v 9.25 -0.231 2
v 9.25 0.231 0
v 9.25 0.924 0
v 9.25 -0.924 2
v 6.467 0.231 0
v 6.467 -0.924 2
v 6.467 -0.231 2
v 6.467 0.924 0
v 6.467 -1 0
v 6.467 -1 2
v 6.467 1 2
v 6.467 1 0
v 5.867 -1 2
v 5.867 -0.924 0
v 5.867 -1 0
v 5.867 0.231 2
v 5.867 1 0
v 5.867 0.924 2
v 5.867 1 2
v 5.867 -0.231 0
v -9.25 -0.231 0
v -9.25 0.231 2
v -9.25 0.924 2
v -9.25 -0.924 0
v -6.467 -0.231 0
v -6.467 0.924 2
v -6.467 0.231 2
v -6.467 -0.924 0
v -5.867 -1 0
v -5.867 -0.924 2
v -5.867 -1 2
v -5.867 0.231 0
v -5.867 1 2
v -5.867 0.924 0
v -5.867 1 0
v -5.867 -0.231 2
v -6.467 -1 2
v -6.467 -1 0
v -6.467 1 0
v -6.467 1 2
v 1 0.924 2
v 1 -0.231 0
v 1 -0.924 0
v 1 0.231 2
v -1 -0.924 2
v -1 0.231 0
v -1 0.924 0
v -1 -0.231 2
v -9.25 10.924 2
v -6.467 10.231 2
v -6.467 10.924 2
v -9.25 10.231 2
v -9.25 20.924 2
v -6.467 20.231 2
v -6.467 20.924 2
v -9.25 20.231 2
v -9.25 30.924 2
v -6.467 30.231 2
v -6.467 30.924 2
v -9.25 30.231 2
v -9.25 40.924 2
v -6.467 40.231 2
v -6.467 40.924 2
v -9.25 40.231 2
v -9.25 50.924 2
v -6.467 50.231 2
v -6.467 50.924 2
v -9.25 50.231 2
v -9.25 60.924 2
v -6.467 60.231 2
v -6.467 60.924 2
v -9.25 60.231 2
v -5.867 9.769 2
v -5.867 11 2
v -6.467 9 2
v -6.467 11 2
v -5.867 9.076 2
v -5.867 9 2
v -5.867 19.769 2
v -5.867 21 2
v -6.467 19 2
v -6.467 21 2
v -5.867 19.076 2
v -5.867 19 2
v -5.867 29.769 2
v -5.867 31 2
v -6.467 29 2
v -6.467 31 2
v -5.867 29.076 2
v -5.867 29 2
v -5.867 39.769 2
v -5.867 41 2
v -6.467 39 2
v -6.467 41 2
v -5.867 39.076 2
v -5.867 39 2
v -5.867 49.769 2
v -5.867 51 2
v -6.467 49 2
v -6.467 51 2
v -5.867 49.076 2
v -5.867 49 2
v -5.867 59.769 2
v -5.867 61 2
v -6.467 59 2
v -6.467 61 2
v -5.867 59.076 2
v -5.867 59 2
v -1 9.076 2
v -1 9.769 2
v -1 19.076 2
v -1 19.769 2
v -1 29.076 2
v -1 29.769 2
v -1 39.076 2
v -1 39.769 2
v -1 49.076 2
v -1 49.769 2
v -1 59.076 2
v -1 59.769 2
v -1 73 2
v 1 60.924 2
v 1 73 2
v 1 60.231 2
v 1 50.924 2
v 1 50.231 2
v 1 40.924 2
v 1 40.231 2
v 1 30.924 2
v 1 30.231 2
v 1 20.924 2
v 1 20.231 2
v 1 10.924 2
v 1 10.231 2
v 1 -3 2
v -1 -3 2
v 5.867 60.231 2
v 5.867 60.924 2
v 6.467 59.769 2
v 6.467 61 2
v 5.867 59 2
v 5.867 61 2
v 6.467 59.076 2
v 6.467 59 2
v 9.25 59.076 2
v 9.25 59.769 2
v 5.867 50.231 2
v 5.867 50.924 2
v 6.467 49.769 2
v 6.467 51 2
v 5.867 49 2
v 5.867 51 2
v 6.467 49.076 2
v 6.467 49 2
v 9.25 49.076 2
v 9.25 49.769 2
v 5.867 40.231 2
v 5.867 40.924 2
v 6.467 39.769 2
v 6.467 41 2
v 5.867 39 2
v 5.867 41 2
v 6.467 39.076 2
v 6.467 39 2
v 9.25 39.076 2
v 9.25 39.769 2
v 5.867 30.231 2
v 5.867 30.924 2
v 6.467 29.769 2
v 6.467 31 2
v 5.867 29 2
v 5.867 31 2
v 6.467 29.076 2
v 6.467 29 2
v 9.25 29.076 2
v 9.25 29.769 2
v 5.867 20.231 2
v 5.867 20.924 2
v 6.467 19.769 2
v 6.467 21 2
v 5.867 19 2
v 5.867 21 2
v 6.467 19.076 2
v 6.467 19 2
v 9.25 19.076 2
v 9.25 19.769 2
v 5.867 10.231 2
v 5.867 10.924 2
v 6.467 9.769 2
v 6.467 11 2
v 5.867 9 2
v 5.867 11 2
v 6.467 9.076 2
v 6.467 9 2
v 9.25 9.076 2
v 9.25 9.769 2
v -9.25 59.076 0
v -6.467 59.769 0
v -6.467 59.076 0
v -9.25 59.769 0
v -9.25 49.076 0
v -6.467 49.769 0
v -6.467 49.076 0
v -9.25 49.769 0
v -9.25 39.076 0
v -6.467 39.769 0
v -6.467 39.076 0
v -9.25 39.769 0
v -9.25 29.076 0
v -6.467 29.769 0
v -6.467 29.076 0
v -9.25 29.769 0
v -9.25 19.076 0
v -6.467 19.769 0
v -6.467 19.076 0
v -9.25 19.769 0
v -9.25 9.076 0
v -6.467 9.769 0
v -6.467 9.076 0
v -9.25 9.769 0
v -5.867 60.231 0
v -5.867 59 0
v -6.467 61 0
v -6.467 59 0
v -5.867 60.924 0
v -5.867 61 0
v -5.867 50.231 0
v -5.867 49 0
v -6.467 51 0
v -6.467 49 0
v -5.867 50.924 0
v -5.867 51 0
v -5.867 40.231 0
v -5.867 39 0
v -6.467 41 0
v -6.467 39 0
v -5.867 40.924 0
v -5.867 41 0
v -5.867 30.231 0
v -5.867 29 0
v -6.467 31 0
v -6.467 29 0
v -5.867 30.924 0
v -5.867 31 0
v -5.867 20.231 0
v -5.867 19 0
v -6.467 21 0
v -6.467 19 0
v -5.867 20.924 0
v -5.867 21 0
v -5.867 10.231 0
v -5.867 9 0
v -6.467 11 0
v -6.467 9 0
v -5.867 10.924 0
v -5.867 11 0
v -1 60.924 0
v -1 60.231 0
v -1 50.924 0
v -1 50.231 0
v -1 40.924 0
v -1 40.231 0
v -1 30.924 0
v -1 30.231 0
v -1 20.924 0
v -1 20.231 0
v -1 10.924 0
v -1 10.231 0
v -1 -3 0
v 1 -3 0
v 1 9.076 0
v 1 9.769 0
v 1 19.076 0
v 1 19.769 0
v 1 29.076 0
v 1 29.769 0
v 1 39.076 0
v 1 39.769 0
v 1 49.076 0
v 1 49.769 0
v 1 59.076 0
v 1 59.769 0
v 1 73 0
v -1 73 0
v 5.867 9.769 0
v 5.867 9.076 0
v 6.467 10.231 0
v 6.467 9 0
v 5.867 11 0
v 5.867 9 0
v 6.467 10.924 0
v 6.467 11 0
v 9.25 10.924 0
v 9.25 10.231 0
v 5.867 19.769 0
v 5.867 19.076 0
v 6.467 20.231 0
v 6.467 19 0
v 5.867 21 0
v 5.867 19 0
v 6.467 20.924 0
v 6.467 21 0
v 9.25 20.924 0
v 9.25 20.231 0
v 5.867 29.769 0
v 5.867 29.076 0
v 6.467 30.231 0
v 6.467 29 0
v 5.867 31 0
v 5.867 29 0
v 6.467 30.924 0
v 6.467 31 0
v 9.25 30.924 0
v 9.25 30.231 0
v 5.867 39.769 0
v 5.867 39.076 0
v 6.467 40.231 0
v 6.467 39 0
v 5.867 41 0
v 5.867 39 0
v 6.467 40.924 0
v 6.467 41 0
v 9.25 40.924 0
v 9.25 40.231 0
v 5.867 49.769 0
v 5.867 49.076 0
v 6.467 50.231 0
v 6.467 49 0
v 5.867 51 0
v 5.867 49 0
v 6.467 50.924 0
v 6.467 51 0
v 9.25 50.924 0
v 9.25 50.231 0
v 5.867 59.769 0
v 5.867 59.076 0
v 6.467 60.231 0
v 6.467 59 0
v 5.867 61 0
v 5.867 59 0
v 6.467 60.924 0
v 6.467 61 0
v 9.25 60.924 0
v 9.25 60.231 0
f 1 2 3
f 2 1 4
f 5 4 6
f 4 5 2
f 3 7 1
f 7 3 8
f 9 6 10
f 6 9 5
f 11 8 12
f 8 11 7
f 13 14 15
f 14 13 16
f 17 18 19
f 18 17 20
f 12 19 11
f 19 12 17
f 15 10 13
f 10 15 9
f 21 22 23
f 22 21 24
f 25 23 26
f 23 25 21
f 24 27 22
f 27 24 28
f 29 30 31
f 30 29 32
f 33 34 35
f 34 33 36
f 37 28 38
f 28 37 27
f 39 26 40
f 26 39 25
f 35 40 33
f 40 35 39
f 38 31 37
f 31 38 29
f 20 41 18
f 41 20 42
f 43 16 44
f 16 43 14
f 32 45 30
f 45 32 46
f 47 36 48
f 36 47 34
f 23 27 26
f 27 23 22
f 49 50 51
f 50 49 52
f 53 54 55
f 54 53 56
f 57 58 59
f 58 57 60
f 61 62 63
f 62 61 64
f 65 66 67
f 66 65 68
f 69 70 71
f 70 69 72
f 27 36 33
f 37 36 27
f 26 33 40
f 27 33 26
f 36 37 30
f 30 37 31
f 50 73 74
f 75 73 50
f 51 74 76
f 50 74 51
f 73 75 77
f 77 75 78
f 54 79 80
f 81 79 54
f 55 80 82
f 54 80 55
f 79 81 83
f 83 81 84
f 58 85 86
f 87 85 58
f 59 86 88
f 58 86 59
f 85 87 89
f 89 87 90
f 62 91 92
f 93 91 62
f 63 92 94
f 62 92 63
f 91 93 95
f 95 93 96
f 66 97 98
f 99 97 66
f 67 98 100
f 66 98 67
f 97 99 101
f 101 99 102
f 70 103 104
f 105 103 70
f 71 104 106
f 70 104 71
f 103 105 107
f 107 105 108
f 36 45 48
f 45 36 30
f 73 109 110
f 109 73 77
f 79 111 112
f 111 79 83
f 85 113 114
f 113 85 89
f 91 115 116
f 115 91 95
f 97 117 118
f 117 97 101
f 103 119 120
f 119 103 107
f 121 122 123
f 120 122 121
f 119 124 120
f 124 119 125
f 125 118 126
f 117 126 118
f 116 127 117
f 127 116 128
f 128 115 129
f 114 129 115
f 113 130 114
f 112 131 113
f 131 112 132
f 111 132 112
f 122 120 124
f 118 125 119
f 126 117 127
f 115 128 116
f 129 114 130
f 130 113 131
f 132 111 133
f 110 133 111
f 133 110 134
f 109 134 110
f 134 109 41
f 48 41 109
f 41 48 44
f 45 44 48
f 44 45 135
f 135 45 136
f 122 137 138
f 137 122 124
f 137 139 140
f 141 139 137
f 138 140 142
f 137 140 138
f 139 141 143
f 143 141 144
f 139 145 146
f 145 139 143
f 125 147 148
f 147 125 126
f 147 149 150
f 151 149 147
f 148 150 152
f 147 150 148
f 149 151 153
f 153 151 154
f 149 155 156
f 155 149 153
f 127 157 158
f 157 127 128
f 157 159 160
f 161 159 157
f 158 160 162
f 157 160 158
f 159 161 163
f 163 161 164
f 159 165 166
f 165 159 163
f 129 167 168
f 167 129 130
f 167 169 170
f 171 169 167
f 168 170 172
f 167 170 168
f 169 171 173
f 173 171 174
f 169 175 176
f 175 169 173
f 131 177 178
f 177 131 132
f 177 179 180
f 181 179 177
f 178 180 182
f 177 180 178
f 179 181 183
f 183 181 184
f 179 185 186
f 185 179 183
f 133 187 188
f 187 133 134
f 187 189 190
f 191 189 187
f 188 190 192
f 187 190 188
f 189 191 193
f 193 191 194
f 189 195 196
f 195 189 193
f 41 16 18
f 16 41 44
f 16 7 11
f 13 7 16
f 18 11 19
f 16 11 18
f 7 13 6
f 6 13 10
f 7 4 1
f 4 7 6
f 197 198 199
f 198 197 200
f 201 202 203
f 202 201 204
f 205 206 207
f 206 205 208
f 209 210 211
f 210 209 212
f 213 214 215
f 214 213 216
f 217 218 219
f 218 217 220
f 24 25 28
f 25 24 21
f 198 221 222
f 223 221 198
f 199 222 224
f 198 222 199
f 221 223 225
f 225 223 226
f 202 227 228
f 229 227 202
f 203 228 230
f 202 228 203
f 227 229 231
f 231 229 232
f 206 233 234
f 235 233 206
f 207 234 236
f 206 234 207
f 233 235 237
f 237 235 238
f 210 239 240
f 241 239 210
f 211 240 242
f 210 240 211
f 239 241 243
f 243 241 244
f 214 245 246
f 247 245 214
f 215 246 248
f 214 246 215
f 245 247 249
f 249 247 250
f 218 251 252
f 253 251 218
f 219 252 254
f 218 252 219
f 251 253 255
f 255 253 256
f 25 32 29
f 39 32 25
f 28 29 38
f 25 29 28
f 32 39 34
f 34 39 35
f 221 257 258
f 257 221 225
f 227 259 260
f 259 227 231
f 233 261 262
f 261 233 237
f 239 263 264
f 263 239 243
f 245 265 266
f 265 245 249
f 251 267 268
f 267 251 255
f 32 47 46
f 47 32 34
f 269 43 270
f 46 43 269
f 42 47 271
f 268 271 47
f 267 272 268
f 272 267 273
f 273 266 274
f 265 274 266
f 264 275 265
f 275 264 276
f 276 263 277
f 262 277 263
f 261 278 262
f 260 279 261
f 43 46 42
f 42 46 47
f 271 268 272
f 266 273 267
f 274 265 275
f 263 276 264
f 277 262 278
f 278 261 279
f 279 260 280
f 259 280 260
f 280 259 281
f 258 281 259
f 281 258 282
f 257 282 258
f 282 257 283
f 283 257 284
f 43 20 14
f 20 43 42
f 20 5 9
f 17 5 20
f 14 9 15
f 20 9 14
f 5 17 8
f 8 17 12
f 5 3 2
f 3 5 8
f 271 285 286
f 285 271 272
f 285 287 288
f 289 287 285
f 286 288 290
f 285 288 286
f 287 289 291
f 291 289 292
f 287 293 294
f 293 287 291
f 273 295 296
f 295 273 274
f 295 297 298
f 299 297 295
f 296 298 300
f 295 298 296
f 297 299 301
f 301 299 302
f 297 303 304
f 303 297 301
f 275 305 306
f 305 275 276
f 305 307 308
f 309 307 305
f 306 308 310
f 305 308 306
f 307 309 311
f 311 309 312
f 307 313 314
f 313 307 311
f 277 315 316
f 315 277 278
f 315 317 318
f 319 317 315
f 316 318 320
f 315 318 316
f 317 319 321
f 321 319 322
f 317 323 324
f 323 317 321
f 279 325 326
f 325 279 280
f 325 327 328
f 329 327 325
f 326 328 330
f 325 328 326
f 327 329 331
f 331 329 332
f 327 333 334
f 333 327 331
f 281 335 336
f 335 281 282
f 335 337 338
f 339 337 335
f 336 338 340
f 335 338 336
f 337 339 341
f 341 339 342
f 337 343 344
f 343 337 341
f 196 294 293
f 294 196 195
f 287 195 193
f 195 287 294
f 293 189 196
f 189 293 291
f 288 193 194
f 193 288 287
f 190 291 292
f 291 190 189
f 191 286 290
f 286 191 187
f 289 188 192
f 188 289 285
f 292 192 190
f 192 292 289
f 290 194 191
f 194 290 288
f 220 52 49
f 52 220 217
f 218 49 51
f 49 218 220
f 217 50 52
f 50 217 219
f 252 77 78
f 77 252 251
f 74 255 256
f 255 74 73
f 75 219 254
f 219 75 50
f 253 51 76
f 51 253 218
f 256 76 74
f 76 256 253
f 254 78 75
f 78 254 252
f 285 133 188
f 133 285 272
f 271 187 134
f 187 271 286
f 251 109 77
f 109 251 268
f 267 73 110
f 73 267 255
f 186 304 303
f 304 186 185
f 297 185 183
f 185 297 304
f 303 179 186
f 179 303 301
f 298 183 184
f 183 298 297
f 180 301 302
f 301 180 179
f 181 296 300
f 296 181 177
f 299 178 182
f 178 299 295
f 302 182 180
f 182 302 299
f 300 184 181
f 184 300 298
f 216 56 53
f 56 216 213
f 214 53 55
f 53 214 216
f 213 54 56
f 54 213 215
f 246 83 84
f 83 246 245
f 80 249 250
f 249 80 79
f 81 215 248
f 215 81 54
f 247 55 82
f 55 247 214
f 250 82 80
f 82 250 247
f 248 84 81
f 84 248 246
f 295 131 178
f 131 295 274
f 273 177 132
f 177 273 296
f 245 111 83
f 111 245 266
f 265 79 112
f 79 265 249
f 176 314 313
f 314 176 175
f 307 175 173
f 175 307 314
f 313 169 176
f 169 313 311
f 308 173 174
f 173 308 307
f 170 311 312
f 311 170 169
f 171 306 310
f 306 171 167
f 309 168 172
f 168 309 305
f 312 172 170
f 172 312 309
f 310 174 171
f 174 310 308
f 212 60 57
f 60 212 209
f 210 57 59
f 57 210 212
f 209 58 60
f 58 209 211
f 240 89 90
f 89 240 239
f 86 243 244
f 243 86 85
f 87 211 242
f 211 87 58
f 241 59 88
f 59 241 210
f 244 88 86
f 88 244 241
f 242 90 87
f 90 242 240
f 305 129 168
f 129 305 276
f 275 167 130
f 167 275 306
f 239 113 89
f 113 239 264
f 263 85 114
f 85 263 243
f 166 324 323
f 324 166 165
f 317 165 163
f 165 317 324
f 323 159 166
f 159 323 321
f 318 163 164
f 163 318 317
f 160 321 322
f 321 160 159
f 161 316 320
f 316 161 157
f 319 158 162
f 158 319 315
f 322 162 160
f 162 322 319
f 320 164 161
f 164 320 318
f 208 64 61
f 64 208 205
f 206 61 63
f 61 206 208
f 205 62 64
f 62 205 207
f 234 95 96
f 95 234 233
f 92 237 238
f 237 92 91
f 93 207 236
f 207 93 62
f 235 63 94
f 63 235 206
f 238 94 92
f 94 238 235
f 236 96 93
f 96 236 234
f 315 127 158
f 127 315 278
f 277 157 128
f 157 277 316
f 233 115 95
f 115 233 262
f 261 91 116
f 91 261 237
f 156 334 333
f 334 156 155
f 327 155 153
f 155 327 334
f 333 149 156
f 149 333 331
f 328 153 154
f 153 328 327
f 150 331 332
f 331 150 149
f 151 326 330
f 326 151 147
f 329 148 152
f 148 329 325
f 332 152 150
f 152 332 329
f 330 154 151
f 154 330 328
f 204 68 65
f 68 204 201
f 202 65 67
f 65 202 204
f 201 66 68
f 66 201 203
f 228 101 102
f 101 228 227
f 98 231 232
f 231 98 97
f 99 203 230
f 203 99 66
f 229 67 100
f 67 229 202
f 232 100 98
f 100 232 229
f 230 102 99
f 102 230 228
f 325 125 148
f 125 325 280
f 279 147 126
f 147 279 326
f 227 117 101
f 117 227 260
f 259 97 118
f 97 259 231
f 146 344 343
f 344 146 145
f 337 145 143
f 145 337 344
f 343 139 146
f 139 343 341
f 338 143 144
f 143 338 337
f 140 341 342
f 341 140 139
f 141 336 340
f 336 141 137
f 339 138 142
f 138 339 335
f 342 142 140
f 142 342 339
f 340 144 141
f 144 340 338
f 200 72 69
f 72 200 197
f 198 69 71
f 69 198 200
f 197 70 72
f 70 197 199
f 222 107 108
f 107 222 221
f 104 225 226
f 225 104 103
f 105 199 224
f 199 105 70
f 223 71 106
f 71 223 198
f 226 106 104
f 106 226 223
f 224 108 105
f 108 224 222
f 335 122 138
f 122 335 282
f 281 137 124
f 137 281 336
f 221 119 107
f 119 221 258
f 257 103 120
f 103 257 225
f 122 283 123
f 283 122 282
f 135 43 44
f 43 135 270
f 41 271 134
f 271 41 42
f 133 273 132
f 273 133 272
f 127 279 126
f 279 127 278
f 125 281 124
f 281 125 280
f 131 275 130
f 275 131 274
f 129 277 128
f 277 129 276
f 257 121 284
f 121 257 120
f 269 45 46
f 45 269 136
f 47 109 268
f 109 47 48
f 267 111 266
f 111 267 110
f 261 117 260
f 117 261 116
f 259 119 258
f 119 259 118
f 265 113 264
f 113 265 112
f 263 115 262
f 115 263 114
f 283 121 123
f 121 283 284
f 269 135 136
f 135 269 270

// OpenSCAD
$fn=50;
ts=2;
tl=0.6;

//шприц
di=20-1.5;//диаметр внутри
do=22;//диаметр снаружи
li=82;//длина внутри
duh=35;//диаметр уха 
huh=2.6;//толщина уха
dno=4.4;//диаметр носика у основания, у конца на % меньше
hno=10;//длина носика
ugol=30;

tn=1;//толщина среза вала
zv=5; //высота центрального диска вала
ze=5; //высота центрального диска ерша
zskr=zv+ze;
dskr=10;//диаметр центрального диска
dval=3+0.4;//диаметр вала привода

f_sh=4.0; //ширина фиксатора
ft=1.5; //основная толщина фиксатора
zbf=2.5+ft;//зуб фиксатора
nfix=10;//нога фиксатора

//fix_pr ();
module fix_pr (){
    //translate([ft/2,(ph3[8][1]+fxw+fdoz)/2-fttz-fxw,f_sh/2])cube([ft, ph3[8][1]+fxw+fdoz,f_sh],true);
    //translate([(fog)/2,-ts/2-2,f_sh/2])cube([fog, ts,f_sh],true);
    translate([-ft/2,nfix/2,f_sh/2])cube([ft, nfix,f_sh],true);
    translate([0,-14.5,0])linear_extrude(f_sh)polygon([[0,0],[-ft,0],[-zbf,15],[0,14.5]]);//0.5 вынужденная поправка в связи с ошибкой во втором слое
}


//disk_z();

module disk_z(){
    translate([0,dval/2,zv/2+ze])cube([3,tn,zv],true);
    difference(){
        translate([0,0,0])cylinder(zskr,dskr/2,dskr/2);
        translate([0,0,ze-0.1])cylinder(zv+0.2,dval/2,dval/2);
        translate([0,0,-0.1+ze/2])cube([ts+0.2,ts+0.2,ze+0.2],true);
    }
}


ersh();

module ersh(){
    ddd=6;
    translate([0,(li-ddd)/2-3,ts/2])cube([ts,li-ddd,ts],true);
    translate([0,0,0])vint();
    translate([0,10,0])vint();
    translate([0,20,0])vint();
    translate([0,30,0])vint();
    translate([0,40,0])vint();
    translate([0,50,0])vint();
    translate([0,60,0])vint();
    //translate([0,70,0])vint();
    //translate([0,80,0])vint();
}

module vint(){
    translate([0,0,ts/2])intersection(){
        union(){
            translate([5*di/12,0,0])rotate([ugol,0,0])cube([di/6,tl,3*ts],true);
            translate([4*di/12,0,0])cube([tl,ts,3*ts],true);
            translate([-5*di/12,0,0])rotate([-ugol,0,0])cube([di/6,tl,3*ts],true);
            translate([-4*di/12,0,0])cube([tl,ts,3*ts],true);
            translate([2*di/12,0,0])rotate([-ugol,0,0])cube([di/3,tl,3*ts],true);
            translate([-2*di/12,0,0])rotate([ugol,0,0])cube([di/3,tl,3*ts],true);
        }
        cube([2*di,li,ts],true); 
    }
}
